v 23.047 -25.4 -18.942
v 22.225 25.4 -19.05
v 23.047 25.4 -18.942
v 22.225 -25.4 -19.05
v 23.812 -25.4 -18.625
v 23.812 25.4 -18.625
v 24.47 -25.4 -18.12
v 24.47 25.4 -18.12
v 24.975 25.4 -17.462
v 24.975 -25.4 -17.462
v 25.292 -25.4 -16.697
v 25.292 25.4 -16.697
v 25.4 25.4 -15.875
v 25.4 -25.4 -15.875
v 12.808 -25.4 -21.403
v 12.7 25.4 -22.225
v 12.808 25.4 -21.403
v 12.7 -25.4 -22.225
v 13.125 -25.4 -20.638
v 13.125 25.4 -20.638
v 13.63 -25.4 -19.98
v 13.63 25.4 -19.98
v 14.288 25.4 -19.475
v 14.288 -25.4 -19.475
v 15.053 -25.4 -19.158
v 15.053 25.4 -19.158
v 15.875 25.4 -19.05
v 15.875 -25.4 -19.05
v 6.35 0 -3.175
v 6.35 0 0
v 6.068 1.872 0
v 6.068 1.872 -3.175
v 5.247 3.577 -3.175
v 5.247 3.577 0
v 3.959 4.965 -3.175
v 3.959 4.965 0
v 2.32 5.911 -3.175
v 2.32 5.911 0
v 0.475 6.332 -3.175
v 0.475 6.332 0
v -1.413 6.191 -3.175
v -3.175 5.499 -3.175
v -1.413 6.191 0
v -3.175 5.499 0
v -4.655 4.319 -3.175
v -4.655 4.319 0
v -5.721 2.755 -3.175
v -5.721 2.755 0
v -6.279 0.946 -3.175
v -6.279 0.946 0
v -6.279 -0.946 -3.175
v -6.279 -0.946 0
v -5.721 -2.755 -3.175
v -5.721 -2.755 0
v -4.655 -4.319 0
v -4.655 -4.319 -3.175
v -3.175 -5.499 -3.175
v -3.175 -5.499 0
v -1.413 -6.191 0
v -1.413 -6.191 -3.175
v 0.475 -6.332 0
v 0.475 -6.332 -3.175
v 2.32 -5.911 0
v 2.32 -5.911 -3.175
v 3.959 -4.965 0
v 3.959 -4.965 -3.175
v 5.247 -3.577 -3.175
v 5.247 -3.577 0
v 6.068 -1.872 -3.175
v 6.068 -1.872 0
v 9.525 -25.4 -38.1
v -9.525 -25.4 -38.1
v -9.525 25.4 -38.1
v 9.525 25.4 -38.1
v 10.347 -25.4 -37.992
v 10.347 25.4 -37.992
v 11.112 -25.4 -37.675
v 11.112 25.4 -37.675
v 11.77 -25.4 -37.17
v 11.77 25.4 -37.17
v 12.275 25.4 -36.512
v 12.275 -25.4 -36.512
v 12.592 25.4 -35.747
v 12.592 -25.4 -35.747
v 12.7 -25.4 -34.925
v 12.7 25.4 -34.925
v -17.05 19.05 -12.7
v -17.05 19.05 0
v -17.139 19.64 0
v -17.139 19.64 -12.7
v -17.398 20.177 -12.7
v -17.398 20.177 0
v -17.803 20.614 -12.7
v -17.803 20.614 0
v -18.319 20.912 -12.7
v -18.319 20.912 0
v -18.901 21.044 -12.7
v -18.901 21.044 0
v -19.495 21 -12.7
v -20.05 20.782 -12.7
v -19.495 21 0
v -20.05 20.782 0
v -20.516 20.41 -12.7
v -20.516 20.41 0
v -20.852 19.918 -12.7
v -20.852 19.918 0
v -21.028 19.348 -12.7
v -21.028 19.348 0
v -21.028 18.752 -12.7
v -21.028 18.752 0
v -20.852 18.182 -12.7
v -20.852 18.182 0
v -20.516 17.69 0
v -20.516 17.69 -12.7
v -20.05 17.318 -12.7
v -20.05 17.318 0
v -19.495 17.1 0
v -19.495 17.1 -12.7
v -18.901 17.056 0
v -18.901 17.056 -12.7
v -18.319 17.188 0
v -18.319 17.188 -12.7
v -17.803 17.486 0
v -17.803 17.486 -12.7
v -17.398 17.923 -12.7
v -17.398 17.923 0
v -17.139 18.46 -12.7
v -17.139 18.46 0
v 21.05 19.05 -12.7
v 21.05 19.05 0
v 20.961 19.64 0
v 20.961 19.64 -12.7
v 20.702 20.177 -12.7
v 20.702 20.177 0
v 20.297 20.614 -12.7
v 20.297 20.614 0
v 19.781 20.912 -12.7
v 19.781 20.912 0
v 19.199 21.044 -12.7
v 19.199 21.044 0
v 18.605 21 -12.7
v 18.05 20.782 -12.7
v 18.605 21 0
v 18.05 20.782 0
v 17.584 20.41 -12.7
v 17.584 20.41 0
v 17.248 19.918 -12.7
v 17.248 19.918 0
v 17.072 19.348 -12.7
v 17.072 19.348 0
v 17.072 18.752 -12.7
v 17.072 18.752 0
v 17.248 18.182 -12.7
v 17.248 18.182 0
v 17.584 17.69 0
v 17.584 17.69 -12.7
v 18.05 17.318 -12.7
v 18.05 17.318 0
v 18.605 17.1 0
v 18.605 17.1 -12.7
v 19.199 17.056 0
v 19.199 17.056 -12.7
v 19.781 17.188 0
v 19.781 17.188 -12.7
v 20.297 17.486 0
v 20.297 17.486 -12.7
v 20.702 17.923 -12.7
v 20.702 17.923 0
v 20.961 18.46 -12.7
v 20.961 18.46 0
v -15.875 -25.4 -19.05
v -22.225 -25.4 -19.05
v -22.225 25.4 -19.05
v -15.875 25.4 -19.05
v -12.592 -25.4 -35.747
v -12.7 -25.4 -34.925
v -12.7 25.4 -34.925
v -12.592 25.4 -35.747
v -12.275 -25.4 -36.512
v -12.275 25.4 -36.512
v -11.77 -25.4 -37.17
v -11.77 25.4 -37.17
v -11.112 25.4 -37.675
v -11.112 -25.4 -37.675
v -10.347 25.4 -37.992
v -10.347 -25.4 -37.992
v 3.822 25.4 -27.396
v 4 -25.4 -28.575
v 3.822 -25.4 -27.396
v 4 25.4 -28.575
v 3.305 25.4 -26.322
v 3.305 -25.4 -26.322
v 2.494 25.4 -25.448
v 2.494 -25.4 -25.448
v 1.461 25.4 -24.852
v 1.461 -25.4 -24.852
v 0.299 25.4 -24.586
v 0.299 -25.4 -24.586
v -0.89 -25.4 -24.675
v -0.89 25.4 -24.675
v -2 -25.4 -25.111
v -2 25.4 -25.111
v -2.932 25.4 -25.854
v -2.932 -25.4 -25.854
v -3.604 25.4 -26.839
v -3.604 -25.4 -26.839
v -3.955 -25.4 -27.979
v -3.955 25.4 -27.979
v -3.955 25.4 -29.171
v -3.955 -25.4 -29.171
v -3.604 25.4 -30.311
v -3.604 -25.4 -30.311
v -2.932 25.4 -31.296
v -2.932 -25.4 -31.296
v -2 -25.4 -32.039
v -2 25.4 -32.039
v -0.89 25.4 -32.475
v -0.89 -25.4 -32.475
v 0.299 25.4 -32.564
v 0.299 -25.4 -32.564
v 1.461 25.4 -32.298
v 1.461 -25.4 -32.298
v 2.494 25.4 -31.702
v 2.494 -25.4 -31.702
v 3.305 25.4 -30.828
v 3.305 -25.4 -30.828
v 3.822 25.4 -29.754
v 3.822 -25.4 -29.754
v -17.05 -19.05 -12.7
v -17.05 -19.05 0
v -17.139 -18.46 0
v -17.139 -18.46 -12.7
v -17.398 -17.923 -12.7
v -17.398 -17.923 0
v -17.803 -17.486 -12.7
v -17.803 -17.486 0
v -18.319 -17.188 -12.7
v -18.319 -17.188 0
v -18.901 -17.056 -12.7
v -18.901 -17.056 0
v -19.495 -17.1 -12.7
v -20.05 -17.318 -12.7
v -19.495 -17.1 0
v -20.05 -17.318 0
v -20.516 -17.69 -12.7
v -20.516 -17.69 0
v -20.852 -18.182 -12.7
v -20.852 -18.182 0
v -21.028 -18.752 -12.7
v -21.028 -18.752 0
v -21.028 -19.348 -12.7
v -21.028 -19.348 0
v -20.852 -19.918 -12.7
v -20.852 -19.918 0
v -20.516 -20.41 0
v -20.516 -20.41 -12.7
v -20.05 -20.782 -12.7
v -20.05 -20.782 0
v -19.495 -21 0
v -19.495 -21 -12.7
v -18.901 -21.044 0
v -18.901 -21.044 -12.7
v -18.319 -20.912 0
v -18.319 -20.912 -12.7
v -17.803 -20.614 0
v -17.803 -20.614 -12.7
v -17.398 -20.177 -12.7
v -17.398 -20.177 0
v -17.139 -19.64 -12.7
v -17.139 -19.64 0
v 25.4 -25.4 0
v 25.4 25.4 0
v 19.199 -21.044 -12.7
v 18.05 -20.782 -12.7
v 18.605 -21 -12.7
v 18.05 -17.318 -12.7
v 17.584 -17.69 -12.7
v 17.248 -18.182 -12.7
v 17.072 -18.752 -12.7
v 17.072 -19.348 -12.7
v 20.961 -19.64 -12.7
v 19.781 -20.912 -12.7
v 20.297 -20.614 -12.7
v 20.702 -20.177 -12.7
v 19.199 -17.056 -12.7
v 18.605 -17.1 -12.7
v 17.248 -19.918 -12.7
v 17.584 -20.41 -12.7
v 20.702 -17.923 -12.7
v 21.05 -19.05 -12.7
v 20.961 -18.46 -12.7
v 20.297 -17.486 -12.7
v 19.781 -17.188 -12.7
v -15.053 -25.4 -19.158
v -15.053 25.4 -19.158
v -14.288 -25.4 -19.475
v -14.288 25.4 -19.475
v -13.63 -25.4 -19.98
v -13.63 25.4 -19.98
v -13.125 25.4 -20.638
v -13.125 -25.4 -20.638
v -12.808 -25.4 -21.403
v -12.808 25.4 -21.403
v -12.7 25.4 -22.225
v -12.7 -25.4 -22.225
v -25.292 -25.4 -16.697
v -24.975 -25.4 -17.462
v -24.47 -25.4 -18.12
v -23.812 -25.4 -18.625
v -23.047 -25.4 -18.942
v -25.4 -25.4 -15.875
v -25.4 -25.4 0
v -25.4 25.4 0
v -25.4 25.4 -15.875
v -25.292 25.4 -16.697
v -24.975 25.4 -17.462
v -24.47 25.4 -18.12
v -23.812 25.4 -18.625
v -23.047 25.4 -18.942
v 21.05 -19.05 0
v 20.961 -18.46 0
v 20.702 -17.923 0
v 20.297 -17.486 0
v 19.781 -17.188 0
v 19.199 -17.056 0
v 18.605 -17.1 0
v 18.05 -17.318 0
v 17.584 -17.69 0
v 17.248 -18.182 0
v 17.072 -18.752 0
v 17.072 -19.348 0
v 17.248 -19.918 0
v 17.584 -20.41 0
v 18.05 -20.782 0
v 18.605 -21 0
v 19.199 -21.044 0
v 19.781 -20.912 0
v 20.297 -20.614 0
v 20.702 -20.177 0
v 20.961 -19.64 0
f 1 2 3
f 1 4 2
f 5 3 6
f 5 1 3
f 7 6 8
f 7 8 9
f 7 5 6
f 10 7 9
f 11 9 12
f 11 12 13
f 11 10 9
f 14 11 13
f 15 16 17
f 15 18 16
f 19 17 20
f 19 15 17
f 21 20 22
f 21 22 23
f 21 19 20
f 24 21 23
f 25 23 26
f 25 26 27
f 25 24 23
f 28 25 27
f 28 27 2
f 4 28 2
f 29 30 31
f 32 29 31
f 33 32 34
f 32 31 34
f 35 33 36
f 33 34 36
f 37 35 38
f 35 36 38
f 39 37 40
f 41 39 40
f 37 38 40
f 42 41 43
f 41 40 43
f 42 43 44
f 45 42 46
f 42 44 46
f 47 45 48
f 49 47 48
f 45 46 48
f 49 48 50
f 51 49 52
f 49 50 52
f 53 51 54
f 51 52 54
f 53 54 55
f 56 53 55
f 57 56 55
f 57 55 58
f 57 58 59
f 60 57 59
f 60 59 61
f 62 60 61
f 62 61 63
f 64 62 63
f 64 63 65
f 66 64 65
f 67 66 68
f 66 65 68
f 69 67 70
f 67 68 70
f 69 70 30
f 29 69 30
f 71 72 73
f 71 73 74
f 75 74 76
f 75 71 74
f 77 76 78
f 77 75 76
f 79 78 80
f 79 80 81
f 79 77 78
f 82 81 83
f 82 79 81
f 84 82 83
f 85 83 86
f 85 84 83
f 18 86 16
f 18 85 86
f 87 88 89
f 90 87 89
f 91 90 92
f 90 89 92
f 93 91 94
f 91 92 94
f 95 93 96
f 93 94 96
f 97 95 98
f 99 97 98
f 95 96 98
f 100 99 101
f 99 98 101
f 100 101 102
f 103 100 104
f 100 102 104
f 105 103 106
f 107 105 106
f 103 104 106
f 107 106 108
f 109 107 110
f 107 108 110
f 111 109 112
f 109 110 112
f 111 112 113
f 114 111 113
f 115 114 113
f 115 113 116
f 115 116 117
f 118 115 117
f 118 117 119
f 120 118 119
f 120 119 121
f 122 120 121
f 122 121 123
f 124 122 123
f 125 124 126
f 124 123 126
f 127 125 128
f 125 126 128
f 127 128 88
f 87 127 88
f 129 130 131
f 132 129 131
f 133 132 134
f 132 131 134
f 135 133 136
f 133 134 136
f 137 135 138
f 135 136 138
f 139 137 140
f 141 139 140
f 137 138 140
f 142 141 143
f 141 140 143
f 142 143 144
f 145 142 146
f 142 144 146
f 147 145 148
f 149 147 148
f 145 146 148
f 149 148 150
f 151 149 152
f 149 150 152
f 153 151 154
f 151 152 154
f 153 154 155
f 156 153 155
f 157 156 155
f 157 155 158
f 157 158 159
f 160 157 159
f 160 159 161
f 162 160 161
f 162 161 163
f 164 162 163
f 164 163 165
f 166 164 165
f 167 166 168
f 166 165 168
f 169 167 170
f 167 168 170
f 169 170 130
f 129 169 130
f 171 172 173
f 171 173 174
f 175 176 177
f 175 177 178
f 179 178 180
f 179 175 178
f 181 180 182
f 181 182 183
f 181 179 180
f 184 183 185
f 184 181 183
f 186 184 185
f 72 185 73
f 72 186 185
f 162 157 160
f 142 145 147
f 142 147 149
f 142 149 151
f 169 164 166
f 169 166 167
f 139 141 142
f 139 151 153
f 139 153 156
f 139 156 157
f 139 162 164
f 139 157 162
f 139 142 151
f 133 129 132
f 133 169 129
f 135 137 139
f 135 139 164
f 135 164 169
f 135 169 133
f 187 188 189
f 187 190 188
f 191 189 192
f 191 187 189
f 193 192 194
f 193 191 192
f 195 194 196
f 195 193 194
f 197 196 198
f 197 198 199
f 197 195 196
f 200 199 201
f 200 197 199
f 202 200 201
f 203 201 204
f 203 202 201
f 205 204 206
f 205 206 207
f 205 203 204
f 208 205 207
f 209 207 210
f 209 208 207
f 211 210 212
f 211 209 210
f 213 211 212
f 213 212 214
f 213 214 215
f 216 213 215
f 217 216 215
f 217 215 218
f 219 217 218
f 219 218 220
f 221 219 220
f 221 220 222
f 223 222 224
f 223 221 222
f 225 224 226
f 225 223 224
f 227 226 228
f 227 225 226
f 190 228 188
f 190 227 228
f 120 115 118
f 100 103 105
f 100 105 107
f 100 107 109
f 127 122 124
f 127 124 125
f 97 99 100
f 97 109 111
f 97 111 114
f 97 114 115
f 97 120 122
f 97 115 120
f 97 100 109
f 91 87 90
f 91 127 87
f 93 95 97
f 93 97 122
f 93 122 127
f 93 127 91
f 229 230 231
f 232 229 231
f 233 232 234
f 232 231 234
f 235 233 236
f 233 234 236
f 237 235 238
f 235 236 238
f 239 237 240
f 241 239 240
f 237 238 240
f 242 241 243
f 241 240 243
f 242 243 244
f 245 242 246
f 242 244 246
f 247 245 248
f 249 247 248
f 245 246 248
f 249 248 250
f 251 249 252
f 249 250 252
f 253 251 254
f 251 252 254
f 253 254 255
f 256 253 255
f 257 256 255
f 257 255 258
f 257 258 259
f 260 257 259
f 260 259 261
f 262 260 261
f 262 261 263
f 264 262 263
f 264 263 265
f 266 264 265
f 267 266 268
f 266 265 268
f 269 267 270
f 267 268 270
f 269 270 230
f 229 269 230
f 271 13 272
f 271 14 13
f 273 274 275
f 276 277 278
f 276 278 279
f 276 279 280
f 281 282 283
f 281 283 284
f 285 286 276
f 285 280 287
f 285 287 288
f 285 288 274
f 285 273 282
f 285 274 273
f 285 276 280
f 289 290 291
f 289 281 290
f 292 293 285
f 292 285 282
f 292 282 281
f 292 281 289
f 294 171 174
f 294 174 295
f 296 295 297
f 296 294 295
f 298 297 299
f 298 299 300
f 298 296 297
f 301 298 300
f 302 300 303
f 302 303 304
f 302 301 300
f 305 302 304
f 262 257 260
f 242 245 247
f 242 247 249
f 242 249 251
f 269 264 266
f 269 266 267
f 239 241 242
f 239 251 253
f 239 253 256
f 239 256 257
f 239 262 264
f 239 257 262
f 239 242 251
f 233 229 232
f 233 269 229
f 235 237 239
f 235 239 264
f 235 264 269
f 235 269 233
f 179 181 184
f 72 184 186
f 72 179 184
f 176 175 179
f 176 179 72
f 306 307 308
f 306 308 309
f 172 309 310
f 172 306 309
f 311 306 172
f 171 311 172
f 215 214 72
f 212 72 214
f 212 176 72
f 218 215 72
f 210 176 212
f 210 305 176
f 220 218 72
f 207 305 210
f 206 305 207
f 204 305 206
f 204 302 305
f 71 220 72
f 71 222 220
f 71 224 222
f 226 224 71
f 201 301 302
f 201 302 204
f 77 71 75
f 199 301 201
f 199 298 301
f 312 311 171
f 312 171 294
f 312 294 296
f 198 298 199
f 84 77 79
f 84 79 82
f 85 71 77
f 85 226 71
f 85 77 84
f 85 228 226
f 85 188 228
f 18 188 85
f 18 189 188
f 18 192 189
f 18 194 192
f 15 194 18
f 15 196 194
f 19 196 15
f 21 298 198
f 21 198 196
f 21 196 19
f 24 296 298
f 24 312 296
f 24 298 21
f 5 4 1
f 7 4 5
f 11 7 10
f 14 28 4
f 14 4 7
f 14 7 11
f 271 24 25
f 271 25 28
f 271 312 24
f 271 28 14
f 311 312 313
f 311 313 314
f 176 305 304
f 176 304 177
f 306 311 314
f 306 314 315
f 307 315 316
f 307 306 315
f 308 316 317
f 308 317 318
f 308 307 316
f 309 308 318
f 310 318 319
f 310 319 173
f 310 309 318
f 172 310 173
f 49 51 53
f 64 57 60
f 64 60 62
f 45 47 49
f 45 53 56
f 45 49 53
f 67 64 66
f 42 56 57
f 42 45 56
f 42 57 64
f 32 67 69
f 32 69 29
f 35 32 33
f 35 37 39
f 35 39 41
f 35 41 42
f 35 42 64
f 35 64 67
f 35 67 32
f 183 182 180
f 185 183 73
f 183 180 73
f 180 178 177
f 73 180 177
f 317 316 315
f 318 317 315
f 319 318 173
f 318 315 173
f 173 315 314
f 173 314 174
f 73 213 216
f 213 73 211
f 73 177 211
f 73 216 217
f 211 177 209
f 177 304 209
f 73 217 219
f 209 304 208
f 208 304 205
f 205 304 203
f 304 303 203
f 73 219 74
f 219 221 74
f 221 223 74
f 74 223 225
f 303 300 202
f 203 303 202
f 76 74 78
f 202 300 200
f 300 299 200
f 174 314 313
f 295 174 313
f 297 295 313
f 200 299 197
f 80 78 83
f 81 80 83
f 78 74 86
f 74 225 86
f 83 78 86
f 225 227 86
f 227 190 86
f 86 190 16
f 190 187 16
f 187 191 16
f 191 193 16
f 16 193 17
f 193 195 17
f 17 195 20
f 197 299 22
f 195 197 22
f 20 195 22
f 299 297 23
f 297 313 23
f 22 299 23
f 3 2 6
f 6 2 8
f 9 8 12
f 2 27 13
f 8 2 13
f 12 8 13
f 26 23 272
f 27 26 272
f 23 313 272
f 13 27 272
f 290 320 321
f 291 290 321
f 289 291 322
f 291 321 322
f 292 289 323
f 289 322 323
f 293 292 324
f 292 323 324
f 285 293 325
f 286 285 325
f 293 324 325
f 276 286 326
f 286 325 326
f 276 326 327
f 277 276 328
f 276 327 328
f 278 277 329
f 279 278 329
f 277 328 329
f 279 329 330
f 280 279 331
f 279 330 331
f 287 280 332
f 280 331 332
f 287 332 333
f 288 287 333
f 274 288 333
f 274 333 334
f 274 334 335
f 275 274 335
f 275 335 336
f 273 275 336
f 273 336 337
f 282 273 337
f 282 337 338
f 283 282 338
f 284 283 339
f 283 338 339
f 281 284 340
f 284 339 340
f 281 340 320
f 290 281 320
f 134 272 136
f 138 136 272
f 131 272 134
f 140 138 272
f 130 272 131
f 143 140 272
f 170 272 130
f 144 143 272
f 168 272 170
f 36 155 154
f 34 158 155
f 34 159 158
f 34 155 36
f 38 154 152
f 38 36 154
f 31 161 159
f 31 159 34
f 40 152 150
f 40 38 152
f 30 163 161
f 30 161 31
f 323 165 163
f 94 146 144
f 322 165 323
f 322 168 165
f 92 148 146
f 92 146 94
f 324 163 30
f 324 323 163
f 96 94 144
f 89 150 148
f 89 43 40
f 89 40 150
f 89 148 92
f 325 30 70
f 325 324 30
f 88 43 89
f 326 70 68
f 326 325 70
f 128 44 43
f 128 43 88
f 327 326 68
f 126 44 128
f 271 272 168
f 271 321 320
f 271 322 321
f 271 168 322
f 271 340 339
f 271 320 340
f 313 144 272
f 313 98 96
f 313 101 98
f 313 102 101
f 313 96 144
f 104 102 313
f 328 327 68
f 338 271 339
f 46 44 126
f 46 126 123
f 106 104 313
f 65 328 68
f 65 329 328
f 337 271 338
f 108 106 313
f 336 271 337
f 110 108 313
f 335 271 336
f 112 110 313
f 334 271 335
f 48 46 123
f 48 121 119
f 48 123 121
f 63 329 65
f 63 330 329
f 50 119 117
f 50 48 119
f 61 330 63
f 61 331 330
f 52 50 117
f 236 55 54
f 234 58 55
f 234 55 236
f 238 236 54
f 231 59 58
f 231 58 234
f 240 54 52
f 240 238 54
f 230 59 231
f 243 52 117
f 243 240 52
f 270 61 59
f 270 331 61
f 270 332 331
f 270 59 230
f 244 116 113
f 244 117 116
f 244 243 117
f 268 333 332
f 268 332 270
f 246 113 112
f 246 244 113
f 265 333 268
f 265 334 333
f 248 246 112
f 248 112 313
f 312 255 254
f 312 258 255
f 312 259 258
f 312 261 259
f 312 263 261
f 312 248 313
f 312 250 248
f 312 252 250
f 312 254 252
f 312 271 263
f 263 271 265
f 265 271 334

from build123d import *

# Parameters (mm, degrees)
F0_R     = 4
F1_DEPTH = 25.4
F2_R     = 2
F3_DEPTH = 12.7
F4_R     = 6.35
F5_DEPTH = 3.175


with BuildPart() as f1:
    # F0 (on Front) → F1 (new body, symmetric)
    with BuildSketch(Plane.XZ):
        with BuildLine():
            Line((25.4, 0), (-25.4, 0))
            Line((-25.4, 0), (-25.4, -15.875))
            ThreePointArc((-25.4, -15.875), (-24.470064, -18.120064), (-22.225, -19.05))
            Line((-22.225, -19.05), (-15.875, -19.05))
            ThreePointArc((-15.875, -19.05), (-13.629936, -19.979936), (-12.7, -22.225))
            Line((-12.7, -22.225), (-12.7, -34.925))
            ThreePointArc((-12.7, -34.925), (-11.770064, -37.170064), (-9.525, -38.1))
            Line((-9.525, -38.1), (9.525, -38.1))
            ThreePointArc((9.525, -38.1), (11.770064, -37.170064), (12.7, -34.925))
            Line((12.7, -34.925), (12.7, -22.225))
            ThreePointArc((12.7, -22.225), (13.629936, -19.979936), (15.875, -19.05))
            Line((15.875, -19.05), (22.225, -19.05))
            ThreePointArc((22.225, -19.05), (24.470064, -18.120064), (25.4, -15.875))
            Line((25.4, -15.875), (25.4, 0))
        make_face()
        with Locations((0, -28.575)):
            Circle(F0_R, mode=Mode.SUBTRACT)
    extrude(amount=F1_DEPTH, both=True)

    # F2 (on face) → F3 (cut)
    with BuildSketch(Plane.XY):
        with Locations((-19.05, -19.05)):
            Circle(F2_R)
        with Locations((19.05, -19.05)):
            Circle(F2_R)
        with Locations((19.05, 19.05)):
            Circle(F2_R)
        with Locations((-19.05, 19.05)):
            Circle(F2_R)
    extrude(amount=-F3_DEPTH, mode=Mode.SUBTRACT)

    # F4 (on face) → F5 (cut)
    with BuildSketch(Plane.XY):
        Circle(F4_R)
    extrude(amount=-F5_DEPTH, mode=Mode.SUBTRACT)


solid = f1.part
